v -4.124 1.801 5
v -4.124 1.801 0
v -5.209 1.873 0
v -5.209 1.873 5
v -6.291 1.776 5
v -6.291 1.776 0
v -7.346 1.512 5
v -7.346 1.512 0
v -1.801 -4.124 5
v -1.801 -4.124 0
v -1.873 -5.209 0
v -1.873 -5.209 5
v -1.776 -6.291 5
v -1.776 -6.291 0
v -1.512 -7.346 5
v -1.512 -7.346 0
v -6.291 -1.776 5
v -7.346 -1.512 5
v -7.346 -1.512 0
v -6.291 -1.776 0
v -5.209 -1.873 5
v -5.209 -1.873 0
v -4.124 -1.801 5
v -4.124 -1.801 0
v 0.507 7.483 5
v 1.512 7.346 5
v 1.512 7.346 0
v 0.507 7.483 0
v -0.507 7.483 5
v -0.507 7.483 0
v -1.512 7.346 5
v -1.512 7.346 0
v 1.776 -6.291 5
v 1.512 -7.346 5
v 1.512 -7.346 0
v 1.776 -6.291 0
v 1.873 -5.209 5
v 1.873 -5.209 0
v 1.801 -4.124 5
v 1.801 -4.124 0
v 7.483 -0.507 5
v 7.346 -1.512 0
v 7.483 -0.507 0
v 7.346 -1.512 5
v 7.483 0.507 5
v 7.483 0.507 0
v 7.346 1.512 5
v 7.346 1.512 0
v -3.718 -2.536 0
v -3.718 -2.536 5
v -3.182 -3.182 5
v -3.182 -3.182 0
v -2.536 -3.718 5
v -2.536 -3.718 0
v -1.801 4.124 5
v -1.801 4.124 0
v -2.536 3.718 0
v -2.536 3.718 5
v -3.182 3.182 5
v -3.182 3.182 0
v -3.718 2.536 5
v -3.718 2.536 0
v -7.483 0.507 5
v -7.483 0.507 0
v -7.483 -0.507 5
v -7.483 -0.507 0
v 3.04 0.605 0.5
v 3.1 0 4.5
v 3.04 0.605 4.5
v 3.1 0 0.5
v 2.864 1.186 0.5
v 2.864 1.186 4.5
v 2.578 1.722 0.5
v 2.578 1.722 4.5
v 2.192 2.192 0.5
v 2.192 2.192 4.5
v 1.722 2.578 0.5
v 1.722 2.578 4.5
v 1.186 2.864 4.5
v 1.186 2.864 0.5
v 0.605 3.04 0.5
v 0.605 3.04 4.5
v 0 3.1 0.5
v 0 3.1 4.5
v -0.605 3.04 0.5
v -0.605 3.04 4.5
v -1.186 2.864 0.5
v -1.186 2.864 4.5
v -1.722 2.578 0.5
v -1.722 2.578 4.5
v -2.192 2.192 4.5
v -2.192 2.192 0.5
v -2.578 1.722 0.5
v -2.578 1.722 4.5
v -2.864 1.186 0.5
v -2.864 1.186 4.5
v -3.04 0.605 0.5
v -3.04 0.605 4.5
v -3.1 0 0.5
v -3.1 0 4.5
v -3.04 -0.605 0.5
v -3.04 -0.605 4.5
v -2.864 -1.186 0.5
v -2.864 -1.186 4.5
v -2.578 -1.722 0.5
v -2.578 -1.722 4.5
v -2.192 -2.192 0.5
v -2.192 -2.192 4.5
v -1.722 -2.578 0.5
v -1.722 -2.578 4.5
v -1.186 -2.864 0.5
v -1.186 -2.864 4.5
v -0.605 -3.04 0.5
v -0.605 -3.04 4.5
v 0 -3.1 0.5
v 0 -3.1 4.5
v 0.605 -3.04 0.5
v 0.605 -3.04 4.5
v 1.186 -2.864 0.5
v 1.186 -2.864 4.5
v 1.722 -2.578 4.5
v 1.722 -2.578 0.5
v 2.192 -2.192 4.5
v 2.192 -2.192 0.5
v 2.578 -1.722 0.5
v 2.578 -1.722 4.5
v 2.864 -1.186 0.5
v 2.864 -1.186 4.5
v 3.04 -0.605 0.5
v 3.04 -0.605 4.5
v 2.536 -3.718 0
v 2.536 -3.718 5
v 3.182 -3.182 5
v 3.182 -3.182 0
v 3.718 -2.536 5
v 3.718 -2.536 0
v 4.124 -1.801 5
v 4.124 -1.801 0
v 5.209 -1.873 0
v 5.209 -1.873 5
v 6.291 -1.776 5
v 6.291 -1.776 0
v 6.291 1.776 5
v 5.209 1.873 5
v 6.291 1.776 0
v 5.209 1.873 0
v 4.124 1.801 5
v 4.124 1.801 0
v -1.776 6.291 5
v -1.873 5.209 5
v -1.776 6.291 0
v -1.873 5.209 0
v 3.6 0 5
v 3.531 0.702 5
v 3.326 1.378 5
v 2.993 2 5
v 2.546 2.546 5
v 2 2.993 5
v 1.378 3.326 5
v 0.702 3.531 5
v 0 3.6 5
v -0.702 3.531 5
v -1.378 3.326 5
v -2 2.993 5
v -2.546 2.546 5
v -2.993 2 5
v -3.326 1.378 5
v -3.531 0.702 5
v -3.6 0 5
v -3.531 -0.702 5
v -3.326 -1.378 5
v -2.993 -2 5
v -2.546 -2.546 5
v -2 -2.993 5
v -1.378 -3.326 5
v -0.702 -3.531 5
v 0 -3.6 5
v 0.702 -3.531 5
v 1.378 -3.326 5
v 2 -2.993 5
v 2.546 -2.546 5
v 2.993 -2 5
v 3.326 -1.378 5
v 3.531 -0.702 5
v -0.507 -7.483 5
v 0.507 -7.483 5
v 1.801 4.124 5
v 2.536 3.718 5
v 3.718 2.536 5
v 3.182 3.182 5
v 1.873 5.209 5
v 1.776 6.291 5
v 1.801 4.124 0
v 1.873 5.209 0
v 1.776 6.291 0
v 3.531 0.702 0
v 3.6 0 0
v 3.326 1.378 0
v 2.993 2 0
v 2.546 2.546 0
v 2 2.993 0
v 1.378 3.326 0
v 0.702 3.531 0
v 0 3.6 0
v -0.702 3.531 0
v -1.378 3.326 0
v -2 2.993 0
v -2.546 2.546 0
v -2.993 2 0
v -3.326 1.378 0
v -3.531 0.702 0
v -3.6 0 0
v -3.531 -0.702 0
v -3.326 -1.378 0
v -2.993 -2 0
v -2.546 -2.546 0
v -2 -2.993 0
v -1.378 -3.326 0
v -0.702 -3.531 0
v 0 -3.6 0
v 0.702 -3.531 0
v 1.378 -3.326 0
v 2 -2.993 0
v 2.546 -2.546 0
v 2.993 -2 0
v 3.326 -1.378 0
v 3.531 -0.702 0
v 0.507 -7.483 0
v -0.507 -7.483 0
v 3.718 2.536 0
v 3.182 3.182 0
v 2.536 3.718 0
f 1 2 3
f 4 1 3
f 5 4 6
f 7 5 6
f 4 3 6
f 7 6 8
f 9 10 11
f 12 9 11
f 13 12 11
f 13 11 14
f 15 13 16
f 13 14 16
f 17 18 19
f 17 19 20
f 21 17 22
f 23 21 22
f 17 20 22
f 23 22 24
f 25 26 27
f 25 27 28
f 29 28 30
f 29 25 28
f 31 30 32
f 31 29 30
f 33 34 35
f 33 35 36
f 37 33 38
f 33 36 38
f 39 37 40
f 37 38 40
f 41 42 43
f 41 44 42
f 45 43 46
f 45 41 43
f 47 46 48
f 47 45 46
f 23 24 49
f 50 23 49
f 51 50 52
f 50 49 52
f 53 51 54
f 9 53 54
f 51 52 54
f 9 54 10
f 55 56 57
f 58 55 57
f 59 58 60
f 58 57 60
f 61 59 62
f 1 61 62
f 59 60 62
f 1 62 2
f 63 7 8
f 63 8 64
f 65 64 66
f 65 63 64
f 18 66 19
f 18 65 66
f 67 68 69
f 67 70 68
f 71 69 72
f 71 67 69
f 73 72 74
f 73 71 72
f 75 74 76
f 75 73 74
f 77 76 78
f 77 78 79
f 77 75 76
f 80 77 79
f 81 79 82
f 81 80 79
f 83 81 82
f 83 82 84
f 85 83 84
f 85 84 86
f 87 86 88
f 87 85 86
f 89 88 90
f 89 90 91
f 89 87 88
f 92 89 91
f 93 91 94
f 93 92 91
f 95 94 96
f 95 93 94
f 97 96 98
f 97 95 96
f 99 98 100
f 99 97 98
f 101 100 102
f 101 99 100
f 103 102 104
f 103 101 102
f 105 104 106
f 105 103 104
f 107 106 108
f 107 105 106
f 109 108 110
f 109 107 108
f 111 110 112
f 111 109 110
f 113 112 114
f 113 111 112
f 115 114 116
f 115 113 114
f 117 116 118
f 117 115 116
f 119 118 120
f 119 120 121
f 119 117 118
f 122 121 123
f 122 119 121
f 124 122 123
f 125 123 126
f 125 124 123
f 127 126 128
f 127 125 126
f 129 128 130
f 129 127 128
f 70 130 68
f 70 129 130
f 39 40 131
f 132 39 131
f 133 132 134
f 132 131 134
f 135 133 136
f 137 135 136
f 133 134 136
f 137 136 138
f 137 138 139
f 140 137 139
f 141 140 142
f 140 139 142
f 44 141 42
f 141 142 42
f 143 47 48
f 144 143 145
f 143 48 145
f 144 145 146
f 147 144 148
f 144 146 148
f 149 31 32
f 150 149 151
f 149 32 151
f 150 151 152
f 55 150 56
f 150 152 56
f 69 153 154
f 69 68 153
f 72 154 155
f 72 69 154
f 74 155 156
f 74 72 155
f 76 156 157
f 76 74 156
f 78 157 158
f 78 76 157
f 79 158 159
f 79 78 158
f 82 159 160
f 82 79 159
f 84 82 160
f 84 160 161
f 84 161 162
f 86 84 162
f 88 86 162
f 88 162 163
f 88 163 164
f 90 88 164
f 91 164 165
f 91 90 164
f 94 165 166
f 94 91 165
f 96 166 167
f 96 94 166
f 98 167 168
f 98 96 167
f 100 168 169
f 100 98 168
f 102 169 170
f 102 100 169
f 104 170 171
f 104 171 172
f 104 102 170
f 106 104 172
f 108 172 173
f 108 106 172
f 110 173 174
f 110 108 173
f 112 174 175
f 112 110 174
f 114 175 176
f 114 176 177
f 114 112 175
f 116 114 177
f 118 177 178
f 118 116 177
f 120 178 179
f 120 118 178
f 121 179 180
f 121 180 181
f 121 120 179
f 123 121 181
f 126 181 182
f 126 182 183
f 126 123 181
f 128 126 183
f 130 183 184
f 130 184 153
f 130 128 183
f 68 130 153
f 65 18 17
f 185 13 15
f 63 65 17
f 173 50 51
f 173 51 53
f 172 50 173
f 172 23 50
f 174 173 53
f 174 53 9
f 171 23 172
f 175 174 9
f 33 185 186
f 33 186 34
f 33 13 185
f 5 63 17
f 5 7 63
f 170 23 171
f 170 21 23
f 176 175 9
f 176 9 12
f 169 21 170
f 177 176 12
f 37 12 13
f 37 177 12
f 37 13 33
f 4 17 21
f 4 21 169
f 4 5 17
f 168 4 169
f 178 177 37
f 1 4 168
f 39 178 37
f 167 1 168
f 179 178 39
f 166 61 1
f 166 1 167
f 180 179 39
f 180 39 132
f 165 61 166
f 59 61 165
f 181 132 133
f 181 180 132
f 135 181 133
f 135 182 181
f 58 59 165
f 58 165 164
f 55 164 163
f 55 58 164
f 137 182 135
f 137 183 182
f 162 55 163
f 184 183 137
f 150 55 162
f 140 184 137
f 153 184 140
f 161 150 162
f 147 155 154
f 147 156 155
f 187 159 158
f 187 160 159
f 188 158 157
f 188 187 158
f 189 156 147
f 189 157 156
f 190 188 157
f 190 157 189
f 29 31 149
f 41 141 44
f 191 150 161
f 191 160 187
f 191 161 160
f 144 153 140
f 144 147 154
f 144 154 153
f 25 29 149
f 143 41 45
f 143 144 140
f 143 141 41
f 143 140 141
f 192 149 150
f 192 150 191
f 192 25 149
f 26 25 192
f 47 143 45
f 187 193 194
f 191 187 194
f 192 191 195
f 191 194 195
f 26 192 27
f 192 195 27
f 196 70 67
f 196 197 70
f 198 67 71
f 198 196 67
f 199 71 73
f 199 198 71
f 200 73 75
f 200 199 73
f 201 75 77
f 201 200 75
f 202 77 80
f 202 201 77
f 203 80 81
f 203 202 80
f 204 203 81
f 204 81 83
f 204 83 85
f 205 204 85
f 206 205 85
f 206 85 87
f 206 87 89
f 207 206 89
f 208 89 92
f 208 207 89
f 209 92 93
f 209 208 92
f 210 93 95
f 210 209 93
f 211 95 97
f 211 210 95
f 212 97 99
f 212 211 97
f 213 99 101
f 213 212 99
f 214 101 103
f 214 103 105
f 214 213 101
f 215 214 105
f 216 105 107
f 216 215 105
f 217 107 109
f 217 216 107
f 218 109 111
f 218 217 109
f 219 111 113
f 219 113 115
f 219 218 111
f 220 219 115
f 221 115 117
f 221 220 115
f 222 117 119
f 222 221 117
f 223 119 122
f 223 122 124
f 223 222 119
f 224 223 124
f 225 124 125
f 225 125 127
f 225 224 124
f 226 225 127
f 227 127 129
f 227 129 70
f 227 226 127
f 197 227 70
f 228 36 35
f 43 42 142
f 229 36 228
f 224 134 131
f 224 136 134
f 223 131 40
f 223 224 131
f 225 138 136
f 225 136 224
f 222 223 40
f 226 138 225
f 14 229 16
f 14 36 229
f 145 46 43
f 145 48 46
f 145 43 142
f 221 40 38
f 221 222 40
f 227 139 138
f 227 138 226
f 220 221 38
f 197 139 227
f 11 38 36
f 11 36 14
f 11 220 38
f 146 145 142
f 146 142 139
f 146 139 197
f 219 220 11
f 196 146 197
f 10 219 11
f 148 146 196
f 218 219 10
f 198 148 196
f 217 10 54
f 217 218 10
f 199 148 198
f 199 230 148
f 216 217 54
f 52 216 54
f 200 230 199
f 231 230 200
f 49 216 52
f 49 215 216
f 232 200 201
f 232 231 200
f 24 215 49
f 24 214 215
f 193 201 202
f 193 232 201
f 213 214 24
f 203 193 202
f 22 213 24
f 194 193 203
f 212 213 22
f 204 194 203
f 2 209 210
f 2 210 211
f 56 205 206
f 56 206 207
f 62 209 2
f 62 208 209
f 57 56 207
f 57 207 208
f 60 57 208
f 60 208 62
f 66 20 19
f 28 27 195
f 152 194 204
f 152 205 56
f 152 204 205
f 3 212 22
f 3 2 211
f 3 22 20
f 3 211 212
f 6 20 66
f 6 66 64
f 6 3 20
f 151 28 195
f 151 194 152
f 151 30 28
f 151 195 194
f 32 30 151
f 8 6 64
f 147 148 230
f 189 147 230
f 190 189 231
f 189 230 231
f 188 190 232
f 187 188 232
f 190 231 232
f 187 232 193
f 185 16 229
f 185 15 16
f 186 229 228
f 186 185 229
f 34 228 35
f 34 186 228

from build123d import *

# Parameters (mm, degrees)
SKETCH2_R          = 15
CUT_EXTRUDE1_DEPTH = 5


with BuildPart() as part:
    # Sketch1 → Revolve1 (revolve)
    with BuildSketch(Plane(origin=(0, 0, 0), x_dir=(0, 0, -1), z_dir=(1, 0, 0))):
        Polygon((-5, 7.5), (-5, 3.6), (-4.5, 3.1), (-0.5, 3.1), (0, 3.6), (0, 7.5), align=None)
    revolve(axis=Axis((0, 0, 0), (0, 0, 1)))

    # Sketch2 → Cut-Extrude1 (cut)
    with BuildSketch(Plane.XY):
        Circle(SKETCH2_R)
        with BuildLine():
            ThreePointArc((-9.892943155, 0), (-7.212770883, -1.555359899), (-4.123759488, -1.801279457))
            ThreePointArc((-4.123759488, -1.801279457), (-3.181980515, -3.181980515), (-1.801279457, -4.123759488))
            ThreePointArc((-1.801279457, -4.123759488), (-1.555359899, -7.212770883), (0, -9.892943155))
            ThreePointArc((0, -9.892943155), (1.555359899, -7.212770883), (1.801279457, -4.123759488))
            ThreePointArc((1.801279457, -4.123759488), (3.181980515, -3.181980515), (4.123759488, -1.801279457))
            ThreePointArc((4.123759488, -1.801279457), (7.212770883, -1.555359899), (9.892943155, 0))
            ThreePointArc((9.892943155, 0), (7.212770883, 1.555359899), (4.123759488, 1.801279457))
            ThreePointArc((4.123759488, 1.801279457), (3.181980515, 3.181980515), (1.801279457, 4.123759488))
            ThreePointArc((1.801279457, 4.123759488), (1.555359899, 7.212770883), (0, 9.892943155))
            ThreePointArc((0, 9.892943155), (-1.555359899, 7.212770883), (-1.801279457, 4.123759488))
            ThreePointArc((-1.801279457, 4.123759488), (-3.181980515, 3.181980515), (-4.123759488, 1.801279457))
            ThreePointArc((-4.123759488, 1.801279457), (-7.212770883, 1.555359899), (-9.892943155, 0))
        make_face(mode=Mode.SUBTRACT)
    extrude(amount=CUT_EXTRUDE1_DEPTH, mode=Mode.SUBTRACT)


solid = part.part
